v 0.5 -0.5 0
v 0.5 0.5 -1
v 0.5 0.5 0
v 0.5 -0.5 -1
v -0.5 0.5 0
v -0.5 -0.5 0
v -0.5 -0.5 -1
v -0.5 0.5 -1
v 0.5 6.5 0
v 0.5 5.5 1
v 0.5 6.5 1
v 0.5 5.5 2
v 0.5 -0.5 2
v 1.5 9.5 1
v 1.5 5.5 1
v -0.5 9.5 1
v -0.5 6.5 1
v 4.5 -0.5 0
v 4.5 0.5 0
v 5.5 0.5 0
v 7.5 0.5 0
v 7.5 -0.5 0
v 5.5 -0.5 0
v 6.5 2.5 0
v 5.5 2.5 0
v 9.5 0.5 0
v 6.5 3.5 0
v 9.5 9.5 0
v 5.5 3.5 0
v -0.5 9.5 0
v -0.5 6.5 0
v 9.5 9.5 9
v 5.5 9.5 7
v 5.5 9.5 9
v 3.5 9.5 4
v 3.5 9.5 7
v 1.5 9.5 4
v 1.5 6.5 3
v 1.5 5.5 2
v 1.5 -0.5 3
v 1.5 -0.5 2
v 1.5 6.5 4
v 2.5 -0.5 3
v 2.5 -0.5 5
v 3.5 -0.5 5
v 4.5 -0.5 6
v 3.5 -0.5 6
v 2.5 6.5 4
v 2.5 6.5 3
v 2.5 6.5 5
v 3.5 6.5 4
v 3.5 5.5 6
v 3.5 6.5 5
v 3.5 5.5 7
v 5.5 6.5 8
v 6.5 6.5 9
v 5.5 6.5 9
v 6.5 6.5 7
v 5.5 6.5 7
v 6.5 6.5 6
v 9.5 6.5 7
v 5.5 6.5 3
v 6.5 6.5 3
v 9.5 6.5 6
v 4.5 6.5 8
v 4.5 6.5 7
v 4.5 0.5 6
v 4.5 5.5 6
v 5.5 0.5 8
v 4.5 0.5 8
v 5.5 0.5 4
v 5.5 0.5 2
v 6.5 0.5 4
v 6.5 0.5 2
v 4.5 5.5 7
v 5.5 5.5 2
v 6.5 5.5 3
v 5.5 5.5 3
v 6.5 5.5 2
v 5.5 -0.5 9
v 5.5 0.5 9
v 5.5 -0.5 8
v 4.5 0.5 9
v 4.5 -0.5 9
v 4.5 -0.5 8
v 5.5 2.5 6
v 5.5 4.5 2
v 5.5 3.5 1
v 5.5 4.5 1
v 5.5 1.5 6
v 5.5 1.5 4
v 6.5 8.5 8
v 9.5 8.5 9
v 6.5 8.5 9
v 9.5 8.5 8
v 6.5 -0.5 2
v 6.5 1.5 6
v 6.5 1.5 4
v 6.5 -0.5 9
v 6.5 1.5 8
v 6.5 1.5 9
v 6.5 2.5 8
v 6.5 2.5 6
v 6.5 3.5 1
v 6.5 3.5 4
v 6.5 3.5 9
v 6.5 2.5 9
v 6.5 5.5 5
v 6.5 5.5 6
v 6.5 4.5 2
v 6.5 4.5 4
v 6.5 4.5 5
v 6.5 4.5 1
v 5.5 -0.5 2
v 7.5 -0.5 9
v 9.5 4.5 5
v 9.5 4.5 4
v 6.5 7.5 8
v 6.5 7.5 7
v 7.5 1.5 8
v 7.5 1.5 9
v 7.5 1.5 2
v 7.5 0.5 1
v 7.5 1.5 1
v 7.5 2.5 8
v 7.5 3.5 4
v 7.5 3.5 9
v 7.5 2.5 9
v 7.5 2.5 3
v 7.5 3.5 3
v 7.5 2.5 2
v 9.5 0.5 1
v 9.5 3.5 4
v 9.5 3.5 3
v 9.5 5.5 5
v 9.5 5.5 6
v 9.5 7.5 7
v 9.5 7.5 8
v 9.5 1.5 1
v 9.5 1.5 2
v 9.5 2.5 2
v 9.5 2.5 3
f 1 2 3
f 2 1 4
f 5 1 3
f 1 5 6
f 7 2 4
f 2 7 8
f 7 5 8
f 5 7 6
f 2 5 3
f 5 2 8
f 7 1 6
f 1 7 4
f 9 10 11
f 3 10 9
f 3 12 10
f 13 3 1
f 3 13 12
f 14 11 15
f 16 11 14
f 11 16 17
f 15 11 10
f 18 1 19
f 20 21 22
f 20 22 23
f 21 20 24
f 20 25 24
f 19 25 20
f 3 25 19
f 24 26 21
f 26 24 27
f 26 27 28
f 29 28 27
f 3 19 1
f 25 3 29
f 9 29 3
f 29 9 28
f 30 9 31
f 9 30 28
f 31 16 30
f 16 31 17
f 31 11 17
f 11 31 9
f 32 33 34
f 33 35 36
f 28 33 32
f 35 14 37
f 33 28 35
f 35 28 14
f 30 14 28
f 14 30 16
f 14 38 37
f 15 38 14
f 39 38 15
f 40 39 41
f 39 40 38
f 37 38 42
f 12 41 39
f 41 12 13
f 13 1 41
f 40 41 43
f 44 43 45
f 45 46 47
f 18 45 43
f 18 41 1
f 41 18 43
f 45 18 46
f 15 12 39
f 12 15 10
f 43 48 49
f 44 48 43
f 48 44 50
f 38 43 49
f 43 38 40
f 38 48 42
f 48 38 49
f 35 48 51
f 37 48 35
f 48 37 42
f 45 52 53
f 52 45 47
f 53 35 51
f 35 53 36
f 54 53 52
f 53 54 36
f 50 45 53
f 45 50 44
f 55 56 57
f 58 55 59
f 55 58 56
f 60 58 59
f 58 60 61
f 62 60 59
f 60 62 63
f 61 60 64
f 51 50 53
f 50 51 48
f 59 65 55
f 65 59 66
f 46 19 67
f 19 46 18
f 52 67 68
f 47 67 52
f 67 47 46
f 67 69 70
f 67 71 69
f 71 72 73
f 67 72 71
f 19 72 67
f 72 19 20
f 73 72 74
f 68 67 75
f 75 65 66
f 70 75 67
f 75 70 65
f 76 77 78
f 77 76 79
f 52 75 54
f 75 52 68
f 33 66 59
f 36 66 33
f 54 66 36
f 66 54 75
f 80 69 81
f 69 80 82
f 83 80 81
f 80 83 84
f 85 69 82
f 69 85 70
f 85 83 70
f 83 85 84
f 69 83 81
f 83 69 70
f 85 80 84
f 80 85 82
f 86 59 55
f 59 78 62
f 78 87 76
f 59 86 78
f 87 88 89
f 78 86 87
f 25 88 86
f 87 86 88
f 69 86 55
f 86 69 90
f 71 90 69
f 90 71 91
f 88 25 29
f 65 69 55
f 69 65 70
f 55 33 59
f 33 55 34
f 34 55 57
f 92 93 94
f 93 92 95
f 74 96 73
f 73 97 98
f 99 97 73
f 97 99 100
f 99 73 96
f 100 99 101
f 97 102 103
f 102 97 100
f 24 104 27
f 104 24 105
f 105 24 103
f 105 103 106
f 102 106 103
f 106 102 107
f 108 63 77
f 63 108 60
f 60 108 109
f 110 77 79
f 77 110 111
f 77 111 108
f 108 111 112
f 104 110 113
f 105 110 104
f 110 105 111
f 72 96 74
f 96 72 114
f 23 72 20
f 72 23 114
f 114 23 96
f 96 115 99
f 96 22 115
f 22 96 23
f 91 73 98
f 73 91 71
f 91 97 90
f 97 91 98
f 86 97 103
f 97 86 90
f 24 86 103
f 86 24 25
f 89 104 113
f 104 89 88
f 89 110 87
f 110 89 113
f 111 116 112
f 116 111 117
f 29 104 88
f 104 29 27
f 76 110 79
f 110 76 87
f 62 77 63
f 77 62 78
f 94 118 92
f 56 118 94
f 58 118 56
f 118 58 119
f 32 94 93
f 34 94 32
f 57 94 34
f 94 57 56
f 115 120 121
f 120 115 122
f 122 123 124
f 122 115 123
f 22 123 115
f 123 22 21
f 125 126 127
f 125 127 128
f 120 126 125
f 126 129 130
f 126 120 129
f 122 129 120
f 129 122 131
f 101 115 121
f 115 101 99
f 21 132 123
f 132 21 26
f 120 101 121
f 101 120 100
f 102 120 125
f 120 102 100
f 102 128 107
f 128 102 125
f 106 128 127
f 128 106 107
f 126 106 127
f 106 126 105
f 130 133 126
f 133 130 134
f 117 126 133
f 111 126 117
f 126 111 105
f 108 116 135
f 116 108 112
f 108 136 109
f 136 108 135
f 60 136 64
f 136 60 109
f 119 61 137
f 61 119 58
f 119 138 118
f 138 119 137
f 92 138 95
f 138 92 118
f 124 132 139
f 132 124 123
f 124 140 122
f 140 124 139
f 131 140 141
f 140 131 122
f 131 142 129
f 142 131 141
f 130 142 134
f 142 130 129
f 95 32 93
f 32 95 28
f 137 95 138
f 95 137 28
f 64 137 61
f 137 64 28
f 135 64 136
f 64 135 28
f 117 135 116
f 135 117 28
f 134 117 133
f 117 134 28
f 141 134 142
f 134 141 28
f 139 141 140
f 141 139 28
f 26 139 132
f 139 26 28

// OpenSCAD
union() {
    translate([0, 0, -0.5]) color([1, 0, 0]) cube([1, 1, 1], center=true);
    translate([0, 7, 0.5]) cube([1, 1, 1], center=true);
    translate([0, 8, 0.5]) cube([1, 1, 1], center=true);
    translate([0, 9, 0.5]) cube([1, 1, 1], center=true);
    translate([1, 0, 1.0]) cube([1, 1, 2], center=true);
    translate([1, 1, 1.0]) cube([1, 1, 2], center=true);
    translate([1, 2, 1.0]) cube([1, 1, 2], center=true);
    translate([1, 3, 1.0]) cube([1, 1, 2], center=true);
    translate([1, 4, 1.0]) cube([1, 1, 2], center=true);
    translate([1, 5, 1.0]) cube([1, 1, 2], center=true);
    translate([1, 6, 0.5]) cube([1, 1, 1], center=true);
    translate([1, 7, 0.5]) cube([1, 1, 1], center=true);
    translate([1, 8, 0.5]) cube([1, 1, 1], center=true);
    translate([1, 9, 0.5]) cube([1, 1, 1], center=true);
    translate([2, 0, 1.5]) cube([1, 1, 3], center=true);
    translate([2, 1, 1.5]) cube([1, 1, 3], center=true);
    translate([2, 2, 1.5]) cube([1, 1, 3], center=true);
    translate([2, 3, 1.5]) cube([1, 1, 3], center=true);
    translate([2, 4, 1.5]) cube([1, 1, 3], center=true);
    translate([2, 5, 1.5]) cube([1, 1, 3], center=true);
    translate([2, 6, 1.5]) cube([1, 1, 3], center=true);
    translate([2, 7, 2.0]) cube([1, 1, 4], center=true);
    translate([2, 8, 2.0]) cube([1, 1, 4], center=true);
    translate([2, 9, 2.0]) cube([1, 1, 4], center=true);
    translate([3, 0, 2.5]) cube([1, 1, 5], center=true);
    translate([3, 1, 2.5]) cube([1, 1, 5], center=true);
    translate([3, 2, 2.5]) cube([1, 1, 5], center=true);
    translate([3, 3, 2.5]) cube([1, 1, 5], center=true);
    translate([3, 4, 2.5]) cube([1, 1, 5], center=true);
    translate([3, 5, 2.5]) cube([1, 1, 5], center=true);
    translate([3, 6, 2.5]) cube([1, 1, 5], center=true);
    translate([3, 7, 2.0]) cube([1, 1, 4], center=true);
    translate([3, 8, 2.0]) cube([1, 1, 4], center=true);
    translate([3, 9, 2.0]) cube([1, 1, 4], center=true);
    translate([4, 0, 3.0]) cube([1, 1, 6], center=true);
    translate([4, 1, 3.0]) cube([1, 1, 6], center=true);
    translate([4, 2, 3.0]) cube([1, 1, 6], center=true);
    translate([4, 3, 3.0]) cube([1, 1, 6], center=true);
    translate([4, 4, 3.0]) cube([1, 1, 6], center=true);
    translate([4, 5, 3.0]) cube([1, 1, 6], center=true);
    translate([4, 6, 3.5]) cube([1, 1, 7], center=true);
    translate([4, 7, 3.5]) cube([1, 1, 7], center=true);
    translate([4, 8, 3.5]) cube([1, 1, 7], center=true);
    translate([4, 9, 3.5]) cube([1, 1, 7], center=true);
    translate([5, 0, 8.5]) color([0, 0, 1]) cube([1, 1, 1], center=true);
    translate([5, 1, 4.0]) cube([1, 1, 8], center=true);
    translate([5, 2, 4.0]) cube([1, 1, 8], center=true);
    translate([5, 3, 4.0]) cube([1, 1, 8], center=true);
    translate([5, 4, 4.0]) cube([1, 1, 8], center=true);
    translate([5, 5, 4.0]) cube([1, 1, 8], center=true);
    translate([5, 6, 4.0]) cube([1, 1, 8], center=true);
    translate([5, 7, 3.5]) cube([1, 1, 7], center=true);
    translate([5, 8, 3.5]) cube([1, 1, 7], center=true);
    translate([5, 9, 3.5]) cube([1, 1, 7], center=true);
    translate([6, 0, 1.0]) cube([1, 1, 2], center=true);
    translate([6, 1, 2.0]) cube([1, 1, 4], center=true);
    translate([6, 2, 3.0]) cube([1, 1, 6], center=true);
    translate([6, 4, 0.5]) cube([1, 1, 1], center=true);
    translate([6, 5, 1.0]) cube([1, 1, 2], center=true);
    translate([6, 6, 1.5]) cube([1, 1, 3], center=true);
    translate([6, 7, 4.5]) cube([1, 1, 9], center=true);
    translate([6, 8, 4.5]) cube([1, 1, 9], center=true);
    translate([6, 9, 4.5]) cube([1, 1, 9], center=true);
    translate([7, 0, 4.5]) cube([1, 1, 9], center=true);
    translate([7, 1, 4.5]) cube([1, 1, 9], center=true);
    translate([7, 2, 4.0]) cube([1, 1, 8], center=true);
    translate([7, 3, 4.5]) cube([1, 1, 9], center=true);
    translate([7, 4, 2.0]) cube([1, 1, 4], center=true);
    translate([7, 5, 2.5]) cube([1, 1, 5], center=true);
    translate([7, 6, 3.0]) cube([1, 1, 6], center=true);
    translate([7, 7, 3.5]) cube([1, 1, 7], center=true);
    translate([7, 8, 4.0]) cube([1, 1, 8], center=true);
    translate([7, 9, 4.5]) cube([1, 1, 9], center=true);
    translate([8, 1, 0.5]) cube([1, 1, 1], center=true);
    translate([8, 2, 1.0]) cube([1, 1, 2], center=true);
    translate([8, 3, 1.5]) cube([1, 1, 3], center=true);
    translate([8, 4, 2.0]) cube([1, 1, 4], center=true);
    translate([8, 5, 2.5]) cube([1, 1, 5], center=true);
    translate([8, 6, 3.0]) cube([1, 1, 6], center=true);
    translate([8, 7, 3.5]) cube([1, 1, 7], center=true);
    translate([8, 8, 4.0]) cube([1, 1, 8], center=true);
    translate([8, 9, 4.5]) cube([1, 1, 9], center=true);
    translate([9, 1, 0.5]) cube([1, 1, 1], center=true);
    translate([9, 2, 1.0]) cube([1, 1, 2], center=true);
    translate([9, 3, 1.5]) cube([1, 1, 3], center=true);
    translate([9, 4, 2.0]) cube([1, 1, 4], center=true);
    translate([9, 5, 2.5]) cube([1, 1, 5], center=true);
    translate([9, 6, 3.0]) cube([1, 1, 6], center=true);
    translate([9, 7, 3.5]) cube([1, 1, 7], center=true);
    translate([9, 8, 4.0]) cube([1, 1, 8], center=true);
    translate([9, 9, 4.5]) cube([1, 1, 9], center=true);
}
